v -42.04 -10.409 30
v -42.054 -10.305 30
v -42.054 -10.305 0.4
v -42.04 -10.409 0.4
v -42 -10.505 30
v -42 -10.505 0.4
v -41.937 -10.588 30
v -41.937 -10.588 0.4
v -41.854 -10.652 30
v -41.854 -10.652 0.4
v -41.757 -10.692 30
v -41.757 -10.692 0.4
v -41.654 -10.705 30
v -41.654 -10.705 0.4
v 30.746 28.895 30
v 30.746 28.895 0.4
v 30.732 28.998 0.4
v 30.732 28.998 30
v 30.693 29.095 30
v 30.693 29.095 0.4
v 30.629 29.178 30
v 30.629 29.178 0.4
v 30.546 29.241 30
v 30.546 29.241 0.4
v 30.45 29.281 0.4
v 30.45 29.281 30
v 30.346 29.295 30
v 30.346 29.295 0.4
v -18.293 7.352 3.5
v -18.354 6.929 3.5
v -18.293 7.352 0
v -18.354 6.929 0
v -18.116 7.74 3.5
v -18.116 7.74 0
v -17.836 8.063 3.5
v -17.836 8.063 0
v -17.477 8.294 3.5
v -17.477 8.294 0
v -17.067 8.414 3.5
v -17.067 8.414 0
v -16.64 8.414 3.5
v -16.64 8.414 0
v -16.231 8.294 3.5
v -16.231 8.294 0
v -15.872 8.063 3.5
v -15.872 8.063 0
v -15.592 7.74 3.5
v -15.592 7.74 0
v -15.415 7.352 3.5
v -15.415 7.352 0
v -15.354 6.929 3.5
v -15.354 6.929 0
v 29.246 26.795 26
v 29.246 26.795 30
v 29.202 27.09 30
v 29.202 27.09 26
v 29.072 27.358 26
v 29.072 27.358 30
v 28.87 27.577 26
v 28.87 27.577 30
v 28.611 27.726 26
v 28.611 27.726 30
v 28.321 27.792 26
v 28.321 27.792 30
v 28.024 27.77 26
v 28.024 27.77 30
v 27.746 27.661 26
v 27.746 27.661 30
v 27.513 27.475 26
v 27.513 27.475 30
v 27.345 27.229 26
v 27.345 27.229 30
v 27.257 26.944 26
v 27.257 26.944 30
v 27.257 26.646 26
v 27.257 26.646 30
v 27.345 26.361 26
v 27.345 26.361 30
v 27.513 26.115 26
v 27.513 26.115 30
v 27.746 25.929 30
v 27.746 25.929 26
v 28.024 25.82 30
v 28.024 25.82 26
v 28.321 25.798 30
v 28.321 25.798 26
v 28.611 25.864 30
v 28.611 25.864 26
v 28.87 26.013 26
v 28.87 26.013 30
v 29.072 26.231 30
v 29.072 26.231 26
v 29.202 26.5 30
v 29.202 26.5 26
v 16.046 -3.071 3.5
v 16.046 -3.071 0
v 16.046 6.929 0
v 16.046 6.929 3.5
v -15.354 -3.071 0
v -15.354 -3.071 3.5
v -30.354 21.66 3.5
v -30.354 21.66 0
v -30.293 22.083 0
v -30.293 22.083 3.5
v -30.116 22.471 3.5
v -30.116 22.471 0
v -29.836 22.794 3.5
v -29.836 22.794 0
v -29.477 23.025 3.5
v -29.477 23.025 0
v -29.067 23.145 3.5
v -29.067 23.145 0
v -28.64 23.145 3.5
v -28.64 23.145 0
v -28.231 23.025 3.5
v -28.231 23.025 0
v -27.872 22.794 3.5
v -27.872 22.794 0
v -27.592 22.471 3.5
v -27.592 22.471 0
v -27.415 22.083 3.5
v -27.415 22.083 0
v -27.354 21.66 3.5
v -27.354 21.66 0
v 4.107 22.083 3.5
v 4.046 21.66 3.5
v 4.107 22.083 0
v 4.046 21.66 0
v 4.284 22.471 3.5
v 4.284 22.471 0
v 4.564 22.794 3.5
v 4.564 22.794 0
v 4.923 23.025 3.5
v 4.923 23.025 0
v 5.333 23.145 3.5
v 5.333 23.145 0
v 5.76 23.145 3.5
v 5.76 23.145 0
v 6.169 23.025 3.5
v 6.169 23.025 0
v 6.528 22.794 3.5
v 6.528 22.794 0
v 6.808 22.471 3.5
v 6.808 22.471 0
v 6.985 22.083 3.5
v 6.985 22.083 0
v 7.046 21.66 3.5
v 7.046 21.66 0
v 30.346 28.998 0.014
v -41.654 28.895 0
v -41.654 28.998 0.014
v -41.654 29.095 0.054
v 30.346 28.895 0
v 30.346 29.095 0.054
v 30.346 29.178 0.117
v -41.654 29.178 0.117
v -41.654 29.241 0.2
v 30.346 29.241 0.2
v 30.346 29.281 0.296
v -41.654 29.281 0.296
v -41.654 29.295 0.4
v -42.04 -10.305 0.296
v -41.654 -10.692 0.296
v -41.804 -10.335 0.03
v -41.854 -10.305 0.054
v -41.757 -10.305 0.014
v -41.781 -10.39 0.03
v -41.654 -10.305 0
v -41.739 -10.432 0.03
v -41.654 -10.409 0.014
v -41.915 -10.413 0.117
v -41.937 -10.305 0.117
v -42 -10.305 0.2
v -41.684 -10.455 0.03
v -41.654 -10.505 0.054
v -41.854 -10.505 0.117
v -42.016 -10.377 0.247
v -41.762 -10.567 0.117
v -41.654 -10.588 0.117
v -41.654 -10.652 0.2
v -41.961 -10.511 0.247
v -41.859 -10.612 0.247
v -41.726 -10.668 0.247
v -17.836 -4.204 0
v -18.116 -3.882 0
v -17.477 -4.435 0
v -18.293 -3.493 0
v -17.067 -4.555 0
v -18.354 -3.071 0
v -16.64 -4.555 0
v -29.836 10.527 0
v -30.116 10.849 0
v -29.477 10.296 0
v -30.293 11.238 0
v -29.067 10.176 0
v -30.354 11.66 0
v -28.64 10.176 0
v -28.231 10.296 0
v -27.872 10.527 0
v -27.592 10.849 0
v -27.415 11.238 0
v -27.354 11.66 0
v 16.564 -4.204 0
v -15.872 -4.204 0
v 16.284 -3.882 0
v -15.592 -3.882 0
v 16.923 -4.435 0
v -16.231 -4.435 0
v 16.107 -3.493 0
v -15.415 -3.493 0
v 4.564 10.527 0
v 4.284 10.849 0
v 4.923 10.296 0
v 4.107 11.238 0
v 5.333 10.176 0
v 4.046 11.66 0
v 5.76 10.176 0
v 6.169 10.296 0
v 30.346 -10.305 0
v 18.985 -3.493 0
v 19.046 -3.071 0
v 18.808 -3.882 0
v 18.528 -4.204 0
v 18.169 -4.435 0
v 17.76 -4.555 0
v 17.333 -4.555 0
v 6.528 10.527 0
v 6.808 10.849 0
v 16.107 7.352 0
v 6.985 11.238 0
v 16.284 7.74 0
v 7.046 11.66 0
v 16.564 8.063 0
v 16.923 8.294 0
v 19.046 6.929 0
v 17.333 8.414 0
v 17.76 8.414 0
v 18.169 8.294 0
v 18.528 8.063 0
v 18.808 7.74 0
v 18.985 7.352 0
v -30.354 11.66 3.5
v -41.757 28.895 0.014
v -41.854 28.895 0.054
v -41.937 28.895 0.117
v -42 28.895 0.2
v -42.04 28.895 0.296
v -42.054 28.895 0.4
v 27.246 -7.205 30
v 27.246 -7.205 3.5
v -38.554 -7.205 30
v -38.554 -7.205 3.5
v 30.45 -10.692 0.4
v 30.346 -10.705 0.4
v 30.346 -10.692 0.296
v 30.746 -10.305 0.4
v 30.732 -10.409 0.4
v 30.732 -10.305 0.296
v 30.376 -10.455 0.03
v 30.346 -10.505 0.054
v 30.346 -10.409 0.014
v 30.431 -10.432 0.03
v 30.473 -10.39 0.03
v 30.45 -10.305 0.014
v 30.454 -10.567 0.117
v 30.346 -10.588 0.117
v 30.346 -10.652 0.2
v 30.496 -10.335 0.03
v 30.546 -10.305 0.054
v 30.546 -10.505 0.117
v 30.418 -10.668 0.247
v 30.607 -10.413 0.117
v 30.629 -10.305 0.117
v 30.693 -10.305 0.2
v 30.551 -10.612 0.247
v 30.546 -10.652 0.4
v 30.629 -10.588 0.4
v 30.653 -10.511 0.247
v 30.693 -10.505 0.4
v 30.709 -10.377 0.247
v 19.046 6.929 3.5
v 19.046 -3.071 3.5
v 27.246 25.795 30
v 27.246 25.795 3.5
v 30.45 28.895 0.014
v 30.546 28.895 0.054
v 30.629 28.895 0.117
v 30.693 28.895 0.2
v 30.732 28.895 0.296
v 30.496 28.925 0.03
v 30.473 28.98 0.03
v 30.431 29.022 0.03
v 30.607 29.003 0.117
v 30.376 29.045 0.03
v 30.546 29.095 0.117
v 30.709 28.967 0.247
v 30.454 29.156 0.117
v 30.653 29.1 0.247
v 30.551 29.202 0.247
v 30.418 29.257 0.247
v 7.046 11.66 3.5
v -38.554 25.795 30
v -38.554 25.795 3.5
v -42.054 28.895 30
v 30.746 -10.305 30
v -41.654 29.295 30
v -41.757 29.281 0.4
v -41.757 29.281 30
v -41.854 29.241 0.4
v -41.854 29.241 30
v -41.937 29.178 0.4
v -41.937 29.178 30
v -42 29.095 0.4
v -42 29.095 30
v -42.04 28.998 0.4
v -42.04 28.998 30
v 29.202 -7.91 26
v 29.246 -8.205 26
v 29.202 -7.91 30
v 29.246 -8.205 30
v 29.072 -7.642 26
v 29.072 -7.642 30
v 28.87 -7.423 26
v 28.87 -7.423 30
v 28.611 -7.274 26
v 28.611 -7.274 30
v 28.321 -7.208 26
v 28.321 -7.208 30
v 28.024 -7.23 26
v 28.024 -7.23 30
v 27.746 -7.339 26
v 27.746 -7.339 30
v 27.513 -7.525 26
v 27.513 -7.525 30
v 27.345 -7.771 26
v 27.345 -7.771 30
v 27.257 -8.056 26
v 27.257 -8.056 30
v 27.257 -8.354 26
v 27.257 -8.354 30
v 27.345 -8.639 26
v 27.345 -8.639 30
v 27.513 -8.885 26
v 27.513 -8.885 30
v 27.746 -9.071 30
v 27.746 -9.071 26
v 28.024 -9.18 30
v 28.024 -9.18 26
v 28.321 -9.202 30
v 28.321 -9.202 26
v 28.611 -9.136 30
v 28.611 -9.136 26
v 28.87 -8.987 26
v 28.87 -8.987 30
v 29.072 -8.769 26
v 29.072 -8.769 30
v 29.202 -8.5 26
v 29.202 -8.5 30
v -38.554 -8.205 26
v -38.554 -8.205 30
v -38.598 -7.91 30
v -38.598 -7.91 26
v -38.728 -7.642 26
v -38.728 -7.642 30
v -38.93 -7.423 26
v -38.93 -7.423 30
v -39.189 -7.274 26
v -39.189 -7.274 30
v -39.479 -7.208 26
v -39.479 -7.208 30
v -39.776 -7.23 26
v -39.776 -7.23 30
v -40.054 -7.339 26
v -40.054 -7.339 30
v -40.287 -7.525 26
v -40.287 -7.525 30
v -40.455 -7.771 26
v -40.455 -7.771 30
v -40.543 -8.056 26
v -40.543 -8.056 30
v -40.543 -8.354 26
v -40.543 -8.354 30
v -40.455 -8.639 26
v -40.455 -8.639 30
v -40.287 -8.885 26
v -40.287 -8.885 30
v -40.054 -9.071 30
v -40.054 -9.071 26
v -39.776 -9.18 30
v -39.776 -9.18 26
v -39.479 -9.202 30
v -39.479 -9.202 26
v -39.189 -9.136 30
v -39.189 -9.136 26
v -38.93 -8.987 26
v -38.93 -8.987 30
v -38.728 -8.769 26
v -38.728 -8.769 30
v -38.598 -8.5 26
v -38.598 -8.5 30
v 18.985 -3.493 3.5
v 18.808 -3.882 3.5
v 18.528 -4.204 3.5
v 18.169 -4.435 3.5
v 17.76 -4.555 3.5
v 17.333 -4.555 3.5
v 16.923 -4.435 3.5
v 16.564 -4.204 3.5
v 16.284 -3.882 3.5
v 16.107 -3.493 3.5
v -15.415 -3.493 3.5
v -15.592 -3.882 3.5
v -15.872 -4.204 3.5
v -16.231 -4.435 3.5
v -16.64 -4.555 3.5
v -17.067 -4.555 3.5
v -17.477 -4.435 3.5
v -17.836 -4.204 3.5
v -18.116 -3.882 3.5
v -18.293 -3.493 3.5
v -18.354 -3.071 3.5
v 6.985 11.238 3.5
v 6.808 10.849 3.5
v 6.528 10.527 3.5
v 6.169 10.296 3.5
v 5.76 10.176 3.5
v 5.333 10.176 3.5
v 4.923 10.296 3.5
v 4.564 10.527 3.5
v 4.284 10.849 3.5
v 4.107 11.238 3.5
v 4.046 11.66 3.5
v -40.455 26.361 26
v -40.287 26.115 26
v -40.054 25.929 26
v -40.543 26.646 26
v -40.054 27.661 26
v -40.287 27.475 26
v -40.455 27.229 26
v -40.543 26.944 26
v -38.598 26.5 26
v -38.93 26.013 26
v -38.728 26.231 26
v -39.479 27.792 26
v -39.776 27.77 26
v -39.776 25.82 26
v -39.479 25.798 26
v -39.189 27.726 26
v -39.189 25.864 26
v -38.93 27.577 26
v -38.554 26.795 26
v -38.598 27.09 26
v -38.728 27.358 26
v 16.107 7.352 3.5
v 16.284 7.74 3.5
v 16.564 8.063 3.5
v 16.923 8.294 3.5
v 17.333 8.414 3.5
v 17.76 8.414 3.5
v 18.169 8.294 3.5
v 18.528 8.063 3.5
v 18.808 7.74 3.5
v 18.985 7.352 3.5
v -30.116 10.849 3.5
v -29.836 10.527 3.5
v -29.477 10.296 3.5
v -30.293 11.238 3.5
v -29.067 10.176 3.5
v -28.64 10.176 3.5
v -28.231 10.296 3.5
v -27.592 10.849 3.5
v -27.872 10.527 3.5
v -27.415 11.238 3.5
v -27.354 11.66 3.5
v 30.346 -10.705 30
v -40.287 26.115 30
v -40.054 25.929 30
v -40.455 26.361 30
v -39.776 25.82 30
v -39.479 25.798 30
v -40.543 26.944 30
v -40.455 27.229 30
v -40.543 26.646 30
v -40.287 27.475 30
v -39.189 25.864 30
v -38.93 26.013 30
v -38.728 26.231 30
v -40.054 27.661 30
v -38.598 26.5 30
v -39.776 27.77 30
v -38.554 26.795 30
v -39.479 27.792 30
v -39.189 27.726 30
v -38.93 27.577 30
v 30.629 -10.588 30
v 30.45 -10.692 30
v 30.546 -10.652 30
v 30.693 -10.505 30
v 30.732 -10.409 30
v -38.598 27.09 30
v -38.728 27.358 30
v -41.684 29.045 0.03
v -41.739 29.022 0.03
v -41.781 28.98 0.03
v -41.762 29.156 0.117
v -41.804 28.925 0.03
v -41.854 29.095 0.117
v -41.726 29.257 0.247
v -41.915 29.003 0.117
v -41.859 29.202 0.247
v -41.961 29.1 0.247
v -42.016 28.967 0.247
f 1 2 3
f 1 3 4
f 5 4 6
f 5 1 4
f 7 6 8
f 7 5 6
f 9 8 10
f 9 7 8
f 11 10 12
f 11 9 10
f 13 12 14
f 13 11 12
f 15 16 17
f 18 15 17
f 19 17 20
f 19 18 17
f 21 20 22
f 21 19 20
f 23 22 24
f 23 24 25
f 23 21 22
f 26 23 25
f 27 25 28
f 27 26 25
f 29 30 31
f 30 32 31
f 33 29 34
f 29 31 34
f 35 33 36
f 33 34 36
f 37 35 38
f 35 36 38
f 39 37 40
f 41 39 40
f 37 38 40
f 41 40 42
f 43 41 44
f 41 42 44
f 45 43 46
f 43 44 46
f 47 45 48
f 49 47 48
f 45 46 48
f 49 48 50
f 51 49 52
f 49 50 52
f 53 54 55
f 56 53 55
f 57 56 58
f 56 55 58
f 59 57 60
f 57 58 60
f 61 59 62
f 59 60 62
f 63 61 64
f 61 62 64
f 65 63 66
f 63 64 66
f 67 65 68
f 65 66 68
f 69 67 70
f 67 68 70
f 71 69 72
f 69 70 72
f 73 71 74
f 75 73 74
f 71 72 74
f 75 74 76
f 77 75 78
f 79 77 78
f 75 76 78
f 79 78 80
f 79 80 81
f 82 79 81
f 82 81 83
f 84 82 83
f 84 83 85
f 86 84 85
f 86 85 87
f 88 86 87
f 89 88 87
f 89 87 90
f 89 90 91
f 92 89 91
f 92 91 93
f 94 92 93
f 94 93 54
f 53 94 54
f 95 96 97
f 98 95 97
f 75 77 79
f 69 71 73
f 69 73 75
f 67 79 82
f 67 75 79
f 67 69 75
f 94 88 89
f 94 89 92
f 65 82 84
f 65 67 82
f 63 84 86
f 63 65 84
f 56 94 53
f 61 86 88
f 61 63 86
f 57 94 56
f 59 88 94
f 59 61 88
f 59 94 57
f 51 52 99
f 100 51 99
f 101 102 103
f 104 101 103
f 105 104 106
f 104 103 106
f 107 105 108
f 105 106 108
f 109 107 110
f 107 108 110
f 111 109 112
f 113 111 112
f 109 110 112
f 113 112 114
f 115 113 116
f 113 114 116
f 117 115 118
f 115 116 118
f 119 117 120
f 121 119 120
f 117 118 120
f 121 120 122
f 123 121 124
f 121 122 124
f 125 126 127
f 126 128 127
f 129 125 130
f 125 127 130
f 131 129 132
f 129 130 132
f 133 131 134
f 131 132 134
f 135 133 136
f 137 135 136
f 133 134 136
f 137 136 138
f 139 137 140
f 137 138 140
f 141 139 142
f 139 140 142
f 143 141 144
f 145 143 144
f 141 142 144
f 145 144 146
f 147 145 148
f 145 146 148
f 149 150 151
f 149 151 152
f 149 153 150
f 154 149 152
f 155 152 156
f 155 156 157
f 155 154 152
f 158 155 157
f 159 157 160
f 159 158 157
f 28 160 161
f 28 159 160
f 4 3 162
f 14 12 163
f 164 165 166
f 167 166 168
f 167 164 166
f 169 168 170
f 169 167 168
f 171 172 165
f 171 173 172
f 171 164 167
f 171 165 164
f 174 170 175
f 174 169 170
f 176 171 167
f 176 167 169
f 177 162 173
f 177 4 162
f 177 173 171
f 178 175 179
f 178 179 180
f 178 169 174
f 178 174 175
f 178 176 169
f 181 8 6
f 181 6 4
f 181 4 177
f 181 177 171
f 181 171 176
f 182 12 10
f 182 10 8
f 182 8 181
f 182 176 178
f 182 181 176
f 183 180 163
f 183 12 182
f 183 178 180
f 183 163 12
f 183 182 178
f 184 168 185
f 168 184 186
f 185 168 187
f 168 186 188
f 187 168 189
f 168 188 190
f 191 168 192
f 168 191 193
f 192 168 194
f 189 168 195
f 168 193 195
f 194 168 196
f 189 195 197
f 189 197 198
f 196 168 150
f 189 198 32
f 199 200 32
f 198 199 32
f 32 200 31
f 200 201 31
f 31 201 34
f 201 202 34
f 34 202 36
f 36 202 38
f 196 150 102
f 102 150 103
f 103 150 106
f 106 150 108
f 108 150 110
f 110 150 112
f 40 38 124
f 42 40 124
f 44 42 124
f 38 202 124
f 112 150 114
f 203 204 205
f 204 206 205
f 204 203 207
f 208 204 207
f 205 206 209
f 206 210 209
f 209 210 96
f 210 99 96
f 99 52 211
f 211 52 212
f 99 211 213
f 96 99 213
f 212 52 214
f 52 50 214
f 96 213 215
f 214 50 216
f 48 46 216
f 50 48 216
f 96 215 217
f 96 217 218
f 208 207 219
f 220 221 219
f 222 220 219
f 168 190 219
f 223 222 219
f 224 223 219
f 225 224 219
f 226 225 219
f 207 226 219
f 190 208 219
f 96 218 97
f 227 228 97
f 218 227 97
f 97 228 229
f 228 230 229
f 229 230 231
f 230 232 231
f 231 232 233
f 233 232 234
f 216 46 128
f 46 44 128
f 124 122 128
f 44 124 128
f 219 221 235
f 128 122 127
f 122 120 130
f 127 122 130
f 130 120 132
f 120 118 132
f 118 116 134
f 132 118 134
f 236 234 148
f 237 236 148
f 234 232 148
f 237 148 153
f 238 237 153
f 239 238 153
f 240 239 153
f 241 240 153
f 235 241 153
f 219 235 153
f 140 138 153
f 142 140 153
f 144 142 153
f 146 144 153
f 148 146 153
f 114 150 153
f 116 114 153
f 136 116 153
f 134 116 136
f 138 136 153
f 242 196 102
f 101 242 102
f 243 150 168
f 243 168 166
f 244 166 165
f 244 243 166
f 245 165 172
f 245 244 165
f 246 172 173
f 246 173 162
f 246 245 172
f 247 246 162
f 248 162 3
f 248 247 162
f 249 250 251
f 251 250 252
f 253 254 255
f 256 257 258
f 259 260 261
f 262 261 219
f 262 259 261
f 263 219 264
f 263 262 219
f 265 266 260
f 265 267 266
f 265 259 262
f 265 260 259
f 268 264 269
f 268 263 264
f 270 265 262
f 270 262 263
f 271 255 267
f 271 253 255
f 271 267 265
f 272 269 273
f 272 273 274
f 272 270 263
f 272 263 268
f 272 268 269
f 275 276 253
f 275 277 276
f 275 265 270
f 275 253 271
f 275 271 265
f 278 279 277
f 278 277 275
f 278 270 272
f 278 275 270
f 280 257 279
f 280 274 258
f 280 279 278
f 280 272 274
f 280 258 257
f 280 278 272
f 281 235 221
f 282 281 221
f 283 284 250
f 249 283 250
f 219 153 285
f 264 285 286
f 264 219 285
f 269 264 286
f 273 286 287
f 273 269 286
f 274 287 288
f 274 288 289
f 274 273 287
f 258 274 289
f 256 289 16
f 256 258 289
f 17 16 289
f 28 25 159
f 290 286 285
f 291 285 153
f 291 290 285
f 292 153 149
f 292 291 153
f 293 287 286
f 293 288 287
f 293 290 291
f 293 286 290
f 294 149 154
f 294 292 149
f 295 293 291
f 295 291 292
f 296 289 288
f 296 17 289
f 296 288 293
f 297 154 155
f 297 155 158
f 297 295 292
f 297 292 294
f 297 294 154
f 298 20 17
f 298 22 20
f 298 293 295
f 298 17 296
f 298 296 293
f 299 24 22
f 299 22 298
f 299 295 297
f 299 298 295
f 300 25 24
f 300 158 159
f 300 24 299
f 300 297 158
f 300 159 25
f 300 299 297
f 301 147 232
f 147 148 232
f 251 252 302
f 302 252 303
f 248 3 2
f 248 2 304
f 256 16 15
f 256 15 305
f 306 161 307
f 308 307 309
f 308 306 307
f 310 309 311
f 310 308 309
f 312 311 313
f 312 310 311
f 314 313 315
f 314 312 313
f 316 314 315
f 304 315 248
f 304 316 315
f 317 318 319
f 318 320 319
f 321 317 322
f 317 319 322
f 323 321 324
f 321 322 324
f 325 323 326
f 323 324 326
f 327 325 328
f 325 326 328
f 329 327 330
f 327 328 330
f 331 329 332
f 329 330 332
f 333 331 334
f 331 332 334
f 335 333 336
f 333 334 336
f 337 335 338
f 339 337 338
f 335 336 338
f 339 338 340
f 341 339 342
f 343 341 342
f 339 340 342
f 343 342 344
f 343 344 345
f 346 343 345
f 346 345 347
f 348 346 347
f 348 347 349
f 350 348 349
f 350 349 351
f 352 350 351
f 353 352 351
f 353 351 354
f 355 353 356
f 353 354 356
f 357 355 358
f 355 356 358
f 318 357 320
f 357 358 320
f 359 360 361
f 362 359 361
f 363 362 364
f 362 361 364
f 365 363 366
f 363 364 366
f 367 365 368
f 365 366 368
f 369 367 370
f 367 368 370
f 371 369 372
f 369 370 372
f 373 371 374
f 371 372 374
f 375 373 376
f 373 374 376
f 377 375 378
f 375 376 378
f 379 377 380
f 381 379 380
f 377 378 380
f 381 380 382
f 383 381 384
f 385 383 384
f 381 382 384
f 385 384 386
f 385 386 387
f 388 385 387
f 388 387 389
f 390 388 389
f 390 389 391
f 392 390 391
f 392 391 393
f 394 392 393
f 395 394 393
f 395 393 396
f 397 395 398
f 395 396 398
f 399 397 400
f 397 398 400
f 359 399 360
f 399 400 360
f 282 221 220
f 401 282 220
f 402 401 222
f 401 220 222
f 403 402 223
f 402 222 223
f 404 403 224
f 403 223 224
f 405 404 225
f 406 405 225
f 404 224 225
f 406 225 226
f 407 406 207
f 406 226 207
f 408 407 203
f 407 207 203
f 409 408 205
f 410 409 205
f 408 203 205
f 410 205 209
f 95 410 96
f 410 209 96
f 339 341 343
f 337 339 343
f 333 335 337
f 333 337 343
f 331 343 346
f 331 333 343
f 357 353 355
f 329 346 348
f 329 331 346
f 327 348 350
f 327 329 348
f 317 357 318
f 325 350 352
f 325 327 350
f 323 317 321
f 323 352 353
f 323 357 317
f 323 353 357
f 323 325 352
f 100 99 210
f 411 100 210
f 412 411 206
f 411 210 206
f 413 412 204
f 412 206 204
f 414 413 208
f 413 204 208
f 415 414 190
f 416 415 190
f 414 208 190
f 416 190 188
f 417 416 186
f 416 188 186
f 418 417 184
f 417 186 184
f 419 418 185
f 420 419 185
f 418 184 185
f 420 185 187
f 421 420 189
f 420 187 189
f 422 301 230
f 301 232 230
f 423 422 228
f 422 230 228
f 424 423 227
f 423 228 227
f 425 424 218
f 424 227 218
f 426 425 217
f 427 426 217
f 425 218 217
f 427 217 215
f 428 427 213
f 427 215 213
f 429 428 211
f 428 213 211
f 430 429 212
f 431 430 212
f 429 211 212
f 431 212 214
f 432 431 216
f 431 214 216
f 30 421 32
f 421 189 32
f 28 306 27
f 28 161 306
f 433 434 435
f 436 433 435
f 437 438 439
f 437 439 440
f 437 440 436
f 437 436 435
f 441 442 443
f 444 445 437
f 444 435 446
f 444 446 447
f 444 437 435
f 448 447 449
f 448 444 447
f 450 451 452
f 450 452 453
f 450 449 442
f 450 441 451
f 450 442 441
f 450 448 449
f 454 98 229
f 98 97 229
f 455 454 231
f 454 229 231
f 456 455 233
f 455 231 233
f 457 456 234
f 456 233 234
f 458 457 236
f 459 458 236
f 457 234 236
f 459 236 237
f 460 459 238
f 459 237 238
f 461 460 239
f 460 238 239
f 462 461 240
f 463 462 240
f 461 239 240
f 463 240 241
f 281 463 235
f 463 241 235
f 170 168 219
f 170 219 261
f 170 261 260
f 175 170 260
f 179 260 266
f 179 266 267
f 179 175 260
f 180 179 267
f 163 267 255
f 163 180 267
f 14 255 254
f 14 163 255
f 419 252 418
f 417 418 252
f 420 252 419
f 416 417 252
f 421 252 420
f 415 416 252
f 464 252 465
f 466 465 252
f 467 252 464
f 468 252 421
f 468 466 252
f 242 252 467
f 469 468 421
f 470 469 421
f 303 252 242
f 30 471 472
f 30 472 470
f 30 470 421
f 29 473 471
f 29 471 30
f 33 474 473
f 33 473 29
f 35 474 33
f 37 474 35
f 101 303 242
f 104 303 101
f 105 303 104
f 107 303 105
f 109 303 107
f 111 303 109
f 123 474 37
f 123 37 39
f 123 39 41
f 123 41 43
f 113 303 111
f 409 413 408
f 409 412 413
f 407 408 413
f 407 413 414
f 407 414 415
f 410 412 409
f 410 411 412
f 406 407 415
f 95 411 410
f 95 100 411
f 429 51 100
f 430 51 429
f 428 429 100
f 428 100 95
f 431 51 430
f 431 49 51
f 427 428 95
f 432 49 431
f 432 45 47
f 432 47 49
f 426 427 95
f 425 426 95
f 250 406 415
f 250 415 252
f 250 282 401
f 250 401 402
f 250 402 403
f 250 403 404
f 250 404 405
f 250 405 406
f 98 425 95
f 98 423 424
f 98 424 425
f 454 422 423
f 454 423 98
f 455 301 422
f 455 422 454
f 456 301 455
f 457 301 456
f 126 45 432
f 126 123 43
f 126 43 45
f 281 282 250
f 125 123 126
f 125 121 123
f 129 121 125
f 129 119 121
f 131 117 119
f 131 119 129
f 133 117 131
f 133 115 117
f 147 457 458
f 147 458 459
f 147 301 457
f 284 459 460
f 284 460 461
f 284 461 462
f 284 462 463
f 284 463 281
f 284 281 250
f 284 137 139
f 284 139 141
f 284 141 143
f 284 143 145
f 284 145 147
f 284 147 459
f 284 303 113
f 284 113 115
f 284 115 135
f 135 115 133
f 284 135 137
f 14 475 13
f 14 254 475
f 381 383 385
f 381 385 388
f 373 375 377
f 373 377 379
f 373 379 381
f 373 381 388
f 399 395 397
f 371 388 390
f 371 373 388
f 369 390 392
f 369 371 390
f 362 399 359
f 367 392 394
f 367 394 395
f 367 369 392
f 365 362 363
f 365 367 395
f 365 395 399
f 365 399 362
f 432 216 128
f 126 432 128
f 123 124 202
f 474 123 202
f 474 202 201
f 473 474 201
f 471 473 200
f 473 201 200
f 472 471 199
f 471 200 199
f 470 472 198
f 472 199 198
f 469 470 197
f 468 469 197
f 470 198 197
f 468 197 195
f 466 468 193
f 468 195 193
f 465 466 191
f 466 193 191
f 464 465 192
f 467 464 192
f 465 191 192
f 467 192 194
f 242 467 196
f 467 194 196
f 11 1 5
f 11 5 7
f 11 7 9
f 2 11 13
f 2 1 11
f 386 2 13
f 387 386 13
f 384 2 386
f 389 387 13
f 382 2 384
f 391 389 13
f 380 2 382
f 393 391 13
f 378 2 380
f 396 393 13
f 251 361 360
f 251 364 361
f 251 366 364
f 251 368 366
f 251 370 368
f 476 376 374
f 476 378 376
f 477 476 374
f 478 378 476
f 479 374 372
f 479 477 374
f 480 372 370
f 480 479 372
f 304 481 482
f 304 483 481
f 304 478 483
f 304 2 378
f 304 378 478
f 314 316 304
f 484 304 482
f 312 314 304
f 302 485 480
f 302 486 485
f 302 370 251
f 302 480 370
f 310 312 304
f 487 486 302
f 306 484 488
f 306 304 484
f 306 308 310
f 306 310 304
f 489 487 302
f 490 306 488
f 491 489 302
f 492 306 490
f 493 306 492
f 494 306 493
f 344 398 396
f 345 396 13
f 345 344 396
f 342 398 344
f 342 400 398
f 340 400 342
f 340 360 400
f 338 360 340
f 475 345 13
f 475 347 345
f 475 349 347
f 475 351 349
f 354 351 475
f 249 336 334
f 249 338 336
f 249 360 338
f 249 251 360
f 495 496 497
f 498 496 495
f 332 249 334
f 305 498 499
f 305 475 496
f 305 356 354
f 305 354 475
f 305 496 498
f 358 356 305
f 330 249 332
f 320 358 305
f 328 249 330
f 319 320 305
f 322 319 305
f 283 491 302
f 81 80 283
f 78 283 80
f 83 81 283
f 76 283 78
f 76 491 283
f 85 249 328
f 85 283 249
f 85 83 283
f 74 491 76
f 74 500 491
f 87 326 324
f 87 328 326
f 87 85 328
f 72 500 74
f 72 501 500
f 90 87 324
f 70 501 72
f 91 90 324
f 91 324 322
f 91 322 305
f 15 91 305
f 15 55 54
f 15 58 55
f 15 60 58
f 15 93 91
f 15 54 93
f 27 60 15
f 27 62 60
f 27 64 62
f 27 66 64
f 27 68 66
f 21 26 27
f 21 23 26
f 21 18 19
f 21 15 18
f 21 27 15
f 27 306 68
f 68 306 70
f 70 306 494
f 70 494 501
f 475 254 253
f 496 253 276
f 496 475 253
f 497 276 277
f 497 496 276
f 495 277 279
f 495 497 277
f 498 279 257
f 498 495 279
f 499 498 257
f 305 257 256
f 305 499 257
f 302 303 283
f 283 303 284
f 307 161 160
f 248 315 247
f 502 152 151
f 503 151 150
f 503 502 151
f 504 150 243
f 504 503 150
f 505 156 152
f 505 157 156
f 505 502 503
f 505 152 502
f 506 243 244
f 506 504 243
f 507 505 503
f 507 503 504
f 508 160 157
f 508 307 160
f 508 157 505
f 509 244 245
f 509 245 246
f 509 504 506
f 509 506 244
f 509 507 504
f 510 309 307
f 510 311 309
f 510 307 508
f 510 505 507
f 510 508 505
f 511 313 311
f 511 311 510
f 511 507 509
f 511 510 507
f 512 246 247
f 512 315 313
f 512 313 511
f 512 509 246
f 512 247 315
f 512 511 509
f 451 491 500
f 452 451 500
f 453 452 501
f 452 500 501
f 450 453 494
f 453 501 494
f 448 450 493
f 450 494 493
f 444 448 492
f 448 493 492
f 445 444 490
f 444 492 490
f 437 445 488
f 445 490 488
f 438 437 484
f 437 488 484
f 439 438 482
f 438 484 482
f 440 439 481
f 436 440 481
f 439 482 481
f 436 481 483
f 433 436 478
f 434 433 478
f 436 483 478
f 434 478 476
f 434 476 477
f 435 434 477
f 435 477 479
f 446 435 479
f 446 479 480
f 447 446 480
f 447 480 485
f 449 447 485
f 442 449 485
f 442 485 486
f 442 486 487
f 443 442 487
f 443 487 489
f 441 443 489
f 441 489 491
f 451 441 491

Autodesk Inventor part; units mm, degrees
ref_plane "YZ Plane" through (0, 0, 0) normal (1, 0, 0) x (0, 1, 0)
ref_plane "XZ Plane" through (0, 0, 0) normal (0, 1, 0) x (-1, 0, 0)
ref_plane "XY Plane" through (0, 0, 0) normal (0, 0, 1) x (1, 0, 0)
sketch "Sketch1" plane through (0, 0, 0) normal (0, 0, 1) x (1, 0, 0)
  line L0 (-42.0539, 29.2948) -> (30.7461, 29.2948)
  line L1 (30.7461, 29.2948) -> (30.7461, -10.7052)
  line L2 (30.7461, -10.7052) -> (-42.0539, -10.7052)
  line L3 (-42.0539, -10.7052) -> (-42.0539, 29.2948)
  point P0 (0, 0)
  dimension "d0" = 72.8
  dimension "d1" = 40
extrude "Extrusion1" add sketch "Sketch1" along normal blind 30
shell "Shell2" thickness 3.5 removed faces 1 at (-17.7872, 15.9615, 30)
sketch "Sketch4" plane through (0, 0, 30) normal (0, 0, 1) x (1, 0, 0)
  circle A0 centre (-39.5539, 26.7948) radius 1
  line L0 (30.7461, 29.2948) -> (-42.0539, 29.2948) projected
  line L1 (-42.0539, 29.2948) -> (-42.0539, -10.7052) projected
  line L2 (-5.6539, 34.5623) -> (-5.6539, 23.6795)
  circle A1 centre (28.2461, 26.7948) radius 1
  line L3 (36.847, 9.2948) -> (23.7014, 9.2948)
  circle A2 centre (28.2461, -8.2052) radius 1
  circle A3 centre (-39.5539, -8.2052) radius 1
  point P0 (0, 0)
  dimension "d26" = 2
  dimension "d27" = 2.5
  dimension "d28" = 2.5
extrude "Extrusion4" cut sketch "Sketch4" against normal blind 4
fillet "Fillet1" radius 0.4 8 edges at (-42.0539, 29.2948, 15) (-42.0539, -10.7052, 15) (30.7461, -10.7052, 15) (30.7461, 29.2948, 15) (-5.6539, -10.7052, 0) (30.7461, 9.2948, 0) (-5.6539, 29.2948, 0) (-42.0539, 9.2948, 0)
sketch "Sketch5" plane through (0, 0, 0) normal (0, 0, -1) x (-1, 0, 0)
  line L0 (41.6539, -10.7052) -> (-30.3461, -10.7052) projected
  line L1 (5.6539, -10.7052) -> (5.6539, 29.2948)
  line L2 (-30.3461, 29.2948) -> (41.6539, 29.2948) projected
  circle A0 centre (22.8539, 9.2948) radius 9.5
  circle A1 centre (-11.5461, 9.2948) radius 9.5
  line L3 (-17.5461, 6.9294) -> (-17.5461, -3.0706) construction
  line L4 (-19.0461, 6.9294) -> (-19.0461, -3.0706)
  line L5 (-16.0461, -3.0706) -> (-16.0461, 6.9294)
  arc A2 (-16.0461, 6.9294) -> (-19.0461, 6.9294) centre (-17.5461, 6.9294) ccw
  arc A3 (-19.0461, -3.0706) -> (-16.0461, -3.0706) centre (-17.5461, -3.0706) ccw
  line L6 (-5.5461, 11.6603) -> (-5.5461, 21.6603) construction
  line L7 (-4.0461, 11.6603) -> (-4.0461, 21.6603)
  line L8 (-7.0461, 21.6603) -> (-7.0461, 11.6603)
  arc A4 (-7.0461, 11.6603) -> (-4.0461, 11.6603) centre (-5.5461, 11.6603) ccw
  arc A5 (-4.0461, 21.6603) -> (-7.0461, 21.6603) centre (-5.5461, 21.6603) ccw
  line L9 (16.8539, 6.9294) -> (16.8539, -3.0706) construction
  line L10 (15.3539, 6.9294) -> (15.3539, -3.0706)
  line L11 (18.3539, -3.0706) -> (18.3539, 6.9294)
  arc A6 (18.3539, 6.9294) -> (15.3539, 6.9294) centre (16.8539, 6.9294) ccw
  arc A7 (15.3539, -3.0706) -> (18.3539, -3.0706) centre (16.8539, -3.0706) ccw
  line L12 (28.8539, 11.6603) -> (28.8539, 21.6603) construction
  line L13 (30.3539, 11.6603) -> (30.3539, 21.6603)
  line L14 (27.3539, 21.6603) -> (27.3539, 11.6603)
  arc A8 (27.3539, 11.6603) -> (30.3539, 11.6603) centre (28.8539, 11.6603) ccw
  arc A9 (30.3539, 21.6603) -> (27.3539, 21.6603) centre (28.8539, 21.6603) ccw
  point P0 (0, 0)
  point P1 (-17.5461, 1.9294)
  point P2 (-5.5461, 16.6603)
  point P3 (16.8539, 1.9294)
  point P4 (28.8539, 16.6603)
  dimension "d32" = 19
  dimension "d33" = 19
  dimension "d34" = 5
  dimension "d35" = 3
  dimension "d36" = 5
  dimension "d37" = 3
  dimension "d38" = 5
  dimension "d39" = 3
  dimension "d40" = 5
  dimension "d41" = 3
  dimension "d42" = 17.2
  dimension "d43" = 17.2
  dimension "d44" = 6
  dimension "d45" = 12
  dimension "d46" = 6
  dimension "d47" = 12
  dimension "d52" = 20
  dimension "d53" = 20
extrude "Extrusion5" cut sketch "Sketch5" against normal through all contours L13 A8 L14 A0 | A0 L14 A9 L13 | L11 A7 L10 A0 | A0 L10 A6 L11 | L7 A4 L8 A1 | A1 L8 A5 L7 | L5 A3 L4 A1 | A1 L4 A2 L5
properties part number "Solenoids_holder"
